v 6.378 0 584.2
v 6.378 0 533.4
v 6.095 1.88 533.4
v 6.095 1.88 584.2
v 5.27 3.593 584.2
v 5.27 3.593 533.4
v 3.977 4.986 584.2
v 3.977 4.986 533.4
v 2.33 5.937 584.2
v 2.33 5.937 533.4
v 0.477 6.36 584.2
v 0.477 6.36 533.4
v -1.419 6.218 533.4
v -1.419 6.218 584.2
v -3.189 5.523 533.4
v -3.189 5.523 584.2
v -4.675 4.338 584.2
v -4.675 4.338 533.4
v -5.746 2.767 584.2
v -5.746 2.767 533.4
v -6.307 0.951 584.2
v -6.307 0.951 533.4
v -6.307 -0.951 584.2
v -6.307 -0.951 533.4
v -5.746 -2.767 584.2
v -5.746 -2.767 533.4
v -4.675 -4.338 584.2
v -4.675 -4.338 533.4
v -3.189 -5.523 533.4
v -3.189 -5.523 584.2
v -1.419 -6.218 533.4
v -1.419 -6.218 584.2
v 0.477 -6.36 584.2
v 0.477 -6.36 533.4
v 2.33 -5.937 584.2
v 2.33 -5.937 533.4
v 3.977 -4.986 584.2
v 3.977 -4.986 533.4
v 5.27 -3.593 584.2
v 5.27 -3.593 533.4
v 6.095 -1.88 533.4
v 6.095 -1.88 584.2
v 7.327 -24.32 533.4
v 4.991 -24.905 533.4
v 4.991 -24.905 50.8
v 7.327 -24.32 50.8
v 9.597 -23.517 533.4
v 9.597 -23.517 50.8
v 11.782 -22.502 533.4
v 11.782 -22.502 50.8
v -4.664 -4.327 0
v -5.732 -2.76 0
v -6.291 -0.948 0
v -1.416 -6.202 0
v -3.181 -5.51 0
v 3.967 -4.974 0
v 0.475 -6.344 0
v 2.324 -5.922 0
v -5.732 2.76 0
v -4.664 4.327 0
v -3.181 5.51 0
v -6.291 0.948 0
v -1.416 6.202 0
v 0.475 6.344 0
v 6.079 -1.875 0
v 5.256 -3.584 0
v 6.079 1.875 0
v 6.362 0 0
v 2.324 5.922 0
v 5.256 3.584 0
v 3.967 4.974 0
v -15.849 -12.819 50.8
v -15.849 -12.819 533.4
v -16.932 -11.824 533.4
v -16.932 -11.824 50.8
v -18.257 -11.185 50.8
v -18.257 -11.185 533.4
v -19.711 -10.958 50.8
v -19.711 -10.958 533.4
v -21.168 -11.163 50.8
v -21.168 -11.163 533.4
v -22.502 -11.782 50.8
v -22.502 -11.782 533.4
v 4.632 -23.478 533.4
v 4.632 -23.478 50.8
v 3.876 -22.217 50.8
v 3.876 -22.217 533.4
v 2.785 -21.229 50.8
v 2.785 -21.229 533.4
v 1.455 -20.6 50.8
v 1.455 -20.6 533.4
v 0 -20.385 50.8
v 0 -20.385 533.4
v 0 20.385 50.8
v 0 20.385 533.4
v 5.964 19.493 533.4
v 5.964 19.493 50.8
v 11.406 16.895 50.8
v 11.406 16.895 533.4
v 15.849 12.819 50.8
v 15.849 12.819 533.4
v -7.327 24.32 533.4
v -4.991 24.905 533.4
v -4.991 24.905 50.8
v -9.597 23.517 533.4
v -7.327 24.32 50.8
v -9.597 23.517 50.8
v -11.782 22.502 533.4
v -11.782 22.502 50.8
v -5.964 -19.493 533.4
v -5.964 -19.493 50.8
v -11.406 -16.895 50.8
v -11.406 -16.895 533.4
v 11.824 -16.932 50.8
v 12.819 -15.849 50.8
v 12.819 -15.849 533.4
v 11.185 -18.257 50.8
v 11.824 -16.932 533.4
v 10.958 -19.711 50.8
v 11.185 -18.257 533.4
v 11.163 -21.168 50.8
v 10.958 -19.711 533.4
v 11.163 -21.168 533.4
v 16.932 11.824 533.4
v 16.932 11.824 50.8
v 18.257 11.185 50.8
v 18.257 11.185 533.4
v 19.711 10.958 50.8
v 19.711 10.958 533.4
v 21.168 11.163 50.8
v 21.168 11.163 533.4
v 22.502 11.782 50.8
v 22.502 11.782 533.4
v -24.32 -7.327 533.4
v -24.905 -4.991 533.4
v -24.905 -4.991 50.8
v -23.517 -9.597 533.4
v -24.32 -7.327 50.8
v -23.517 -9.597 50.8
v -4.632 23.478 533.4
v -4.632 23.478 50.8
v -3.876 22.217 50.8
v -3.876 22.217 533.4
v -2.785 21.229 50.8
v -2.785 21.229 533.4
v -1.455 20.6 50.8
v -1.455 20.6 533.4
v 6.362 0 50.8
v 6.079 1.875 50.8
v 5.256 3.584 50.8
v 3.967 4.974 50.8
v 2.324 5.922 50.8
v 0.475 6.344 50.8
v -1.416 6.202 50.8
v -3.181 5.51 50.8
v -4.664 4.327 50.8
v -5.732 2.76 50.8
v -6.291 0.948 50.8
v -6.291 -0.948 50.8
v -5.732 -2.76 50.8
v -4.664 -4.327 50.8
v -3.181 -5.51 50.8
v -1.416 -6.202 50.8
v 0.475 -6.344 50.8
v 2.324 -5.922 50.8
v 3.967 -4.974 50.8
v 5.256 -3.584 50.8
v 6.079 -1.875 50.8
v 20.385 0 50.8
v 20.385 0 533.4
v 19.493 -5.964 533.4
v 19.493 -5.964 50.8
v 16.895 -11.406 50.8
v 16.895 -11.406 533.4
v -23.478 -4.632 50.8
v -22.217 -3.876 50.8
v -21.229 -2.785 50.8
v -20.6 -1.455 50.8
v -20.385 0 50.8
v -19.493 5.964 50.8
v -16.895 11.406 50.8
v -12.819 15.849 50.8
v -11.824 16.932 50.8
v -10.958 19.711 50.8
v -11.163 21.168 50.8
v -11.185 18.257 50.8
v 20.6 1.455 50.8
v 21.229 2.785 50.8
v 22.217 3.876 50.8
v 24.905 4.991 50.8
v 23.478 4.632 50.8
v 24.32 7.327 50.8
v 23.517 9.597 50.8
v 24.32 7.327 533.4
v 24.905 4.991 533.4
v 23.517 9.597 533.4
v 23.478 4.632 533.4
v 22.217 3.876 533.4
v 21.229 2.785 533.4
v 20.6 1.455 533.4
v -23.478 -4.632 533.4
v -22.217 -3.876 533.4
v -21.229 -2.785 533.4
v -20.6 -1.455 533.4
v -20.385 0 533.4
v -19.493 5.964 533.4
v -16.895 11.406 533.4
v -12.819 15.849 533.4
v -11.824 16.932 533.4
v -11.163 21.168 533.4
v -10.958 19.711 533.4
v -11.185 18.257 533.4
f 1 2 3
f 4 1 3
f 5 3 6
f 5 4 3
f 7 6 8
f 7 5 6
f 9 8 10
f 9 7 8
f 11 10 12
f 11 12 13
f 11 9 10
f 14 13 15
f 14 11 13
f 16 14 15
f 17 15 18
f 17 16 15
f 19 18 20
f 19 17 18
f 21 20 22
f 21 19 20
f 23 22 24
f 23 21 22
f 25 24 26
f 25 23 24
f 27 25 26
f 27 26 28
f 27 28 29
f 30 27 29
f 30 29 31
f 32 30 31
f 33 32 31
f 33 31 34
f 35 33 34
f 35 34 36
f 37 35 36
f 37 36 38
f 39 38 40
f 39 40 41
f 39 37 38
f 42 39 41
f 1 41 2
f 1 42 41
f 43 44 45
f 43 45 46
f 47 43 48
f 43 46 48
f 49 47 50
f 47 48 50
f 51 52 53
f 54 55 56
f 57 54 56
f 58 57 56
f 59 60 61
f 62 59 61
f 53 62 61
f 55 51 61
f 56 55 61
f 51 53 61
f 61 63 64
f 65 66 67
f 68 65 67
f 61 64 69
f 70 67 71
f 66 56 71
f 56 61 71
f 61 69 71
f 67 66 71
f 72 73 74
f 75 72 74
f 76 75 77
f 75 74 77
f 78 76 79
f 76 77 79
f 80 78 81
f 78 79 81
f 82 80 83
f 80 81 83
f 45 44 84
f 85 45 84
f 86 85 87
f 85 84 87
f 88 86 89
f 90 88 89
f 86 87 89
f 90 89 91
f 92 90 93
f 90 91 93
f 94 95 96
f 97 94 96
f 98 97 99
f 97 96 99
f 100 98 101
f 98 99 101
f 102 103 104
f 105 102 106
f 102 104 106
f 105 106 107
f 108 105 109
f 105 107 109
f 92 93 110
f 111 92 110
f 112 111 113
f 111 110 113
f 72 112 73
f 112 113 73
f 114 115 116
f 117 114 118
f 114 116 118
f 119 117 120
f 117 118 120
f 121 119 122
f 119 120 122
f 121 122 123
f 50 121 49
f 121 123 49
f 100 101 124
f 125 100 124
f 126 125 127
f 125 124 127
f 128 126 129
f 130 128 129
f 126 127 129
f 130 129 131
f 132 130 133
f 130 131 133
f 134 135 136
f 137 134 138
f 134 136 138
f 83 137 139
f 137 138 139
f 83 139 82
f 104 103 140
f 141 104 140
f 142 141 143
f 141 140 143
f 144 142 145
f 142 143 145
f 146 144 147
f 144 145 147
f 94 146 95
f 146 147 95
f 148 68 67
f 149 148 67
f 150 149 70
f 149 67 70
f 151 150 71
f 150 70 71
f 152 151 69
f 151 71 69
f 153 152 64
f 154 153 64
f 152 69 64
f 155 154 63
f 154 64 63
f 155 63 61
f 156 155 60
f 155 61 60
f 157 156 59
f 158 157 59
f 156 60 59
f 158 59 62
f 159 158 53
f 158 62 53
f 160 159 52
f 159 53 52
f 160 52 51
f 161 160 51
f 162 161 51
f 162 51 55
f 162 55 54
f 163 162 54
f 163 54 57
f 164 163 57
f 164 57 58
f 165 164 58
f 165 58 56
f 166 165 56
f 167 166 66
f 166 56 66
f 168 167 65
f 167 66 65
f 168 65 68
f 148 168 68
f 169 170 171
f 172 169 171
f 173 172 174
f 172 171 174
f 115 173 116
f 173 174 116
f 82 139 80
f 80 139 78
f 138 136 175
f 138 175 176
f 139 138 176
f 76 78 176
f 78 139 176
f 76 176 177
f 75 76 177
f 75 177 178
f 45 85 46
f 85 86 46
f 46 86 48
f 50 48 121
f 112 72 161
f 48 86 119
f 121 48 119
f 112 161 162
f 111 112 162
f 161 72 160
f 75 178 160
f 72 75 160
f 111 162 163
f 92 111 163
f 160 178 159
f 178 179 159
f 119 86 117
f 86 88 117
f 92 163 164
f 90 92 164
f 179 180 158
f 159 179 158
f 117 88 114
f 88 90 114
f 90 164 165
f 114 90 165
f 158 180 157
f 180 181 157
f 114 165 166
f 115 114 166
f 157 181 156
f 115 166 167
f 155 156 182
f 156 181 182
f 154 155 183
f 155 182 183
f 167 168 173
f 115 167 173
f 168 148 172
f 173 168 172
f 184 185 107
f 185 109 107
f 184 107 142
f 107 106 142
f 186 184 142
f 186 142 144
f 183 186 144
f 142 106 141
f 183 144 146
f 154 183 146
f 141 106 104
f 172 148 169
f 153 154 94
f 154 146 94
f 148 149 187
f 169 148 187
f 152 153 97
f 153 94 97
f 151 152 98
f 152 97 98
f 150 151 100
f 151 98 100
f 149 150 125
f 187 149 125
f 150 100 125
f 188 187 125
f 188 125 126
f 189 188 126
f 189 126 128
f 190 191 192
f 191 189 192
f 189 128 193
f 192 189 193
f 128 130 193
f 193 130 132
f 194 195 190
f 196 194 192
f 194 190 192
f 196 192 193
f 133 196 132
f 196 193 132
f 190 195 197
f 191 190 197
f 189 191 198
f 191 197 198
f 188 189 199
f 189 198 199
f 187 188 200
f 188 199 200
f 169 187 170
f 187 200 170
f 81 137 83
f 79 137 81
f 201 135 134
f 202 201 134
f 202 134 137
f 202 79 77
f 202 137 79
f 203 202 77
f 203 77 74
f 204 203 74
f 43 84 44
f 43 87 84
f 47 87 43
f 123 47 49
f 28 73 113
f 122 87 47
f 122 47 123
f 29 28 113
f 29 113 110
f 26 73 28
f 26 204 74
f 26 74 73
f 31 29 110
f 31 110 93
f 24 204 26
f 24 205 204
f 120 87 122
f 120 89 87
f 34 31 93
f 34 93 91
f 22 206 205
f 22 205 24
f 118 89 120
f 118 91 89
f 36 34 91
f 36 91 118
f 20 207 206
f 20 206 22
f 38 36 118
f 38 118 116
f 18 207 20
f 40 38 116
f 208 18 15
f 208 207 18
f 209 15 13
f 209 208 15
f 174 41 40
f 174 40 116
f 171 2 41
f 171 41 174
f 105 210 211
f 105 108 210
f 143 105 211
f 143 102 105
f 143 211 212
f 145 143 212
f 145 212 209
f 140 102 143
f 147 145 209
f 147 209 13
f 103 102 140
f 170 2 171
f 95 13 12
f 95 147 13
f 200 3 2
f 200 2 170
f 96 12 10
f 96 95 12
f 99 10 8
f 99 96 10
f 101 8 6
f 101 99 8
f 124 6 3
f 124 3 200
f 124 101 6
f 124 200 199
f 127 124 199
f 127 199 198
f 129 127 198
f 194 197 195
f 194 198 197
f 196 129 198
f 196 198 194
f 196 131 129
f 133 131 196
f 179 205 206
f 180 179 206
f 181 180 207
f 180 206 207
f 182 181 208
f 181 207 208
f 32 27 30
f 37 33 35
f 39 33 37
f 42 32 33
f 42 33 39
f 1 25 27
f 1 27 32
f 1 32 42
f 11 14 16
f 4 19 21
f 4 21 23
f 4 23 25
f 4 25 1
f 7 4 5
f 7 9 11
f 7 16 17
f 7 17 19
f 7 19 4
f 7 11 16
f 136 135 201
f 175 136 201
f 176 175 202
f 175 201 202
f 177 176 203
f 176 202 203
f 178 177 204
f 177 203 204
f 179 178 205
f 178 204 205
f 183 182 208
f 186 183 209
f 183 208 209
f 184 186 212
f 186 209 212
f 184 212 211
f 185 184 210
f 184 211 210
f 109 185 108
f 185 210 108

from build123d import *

# Parameters (mm, degrees)
SKETCH1_R           = 25.4
BOSS_EXTRUDE1_DEPTH = 584.2
SKETCH2_OUTSIDE_W   = 170.52
SKETCH2_OUTSIDE_H   = 170.52
SKETCH2_OUTSIDE_R   = 6.361935525
CUT_EXTRUDE1_DEPTH  = 50.8
SKETCH5_OUTSIDE_W   = 170.52
SKETCH5_OUTSIDE_H   = 170.52
SKETCH5_OUTSIDE_R   = 6.377907631
CUT_EXTRUDE4_DEPTH  = 50.8
CUT_EXTRUDE5_DEPTH  = 535.94
CIRPATTERN1_COUNT   = 4


with BuildPart() as part:
    # Sketch1 → Boss-Extrude1 (new body)
    with BuildSketch(Plane.XY):
        Circle(SKETCH1_R)
    extrude(amount=BOSS_EXTRUDE1_DEPTH)

    # Sketch2 outside → Cut-Extrude1 (cut)
    with BuildSketch(Plane.XY):
        Rectangle(SKETCH2_OUTSIDE_W, SKETCH2_OUTSIDE_H)
        Circle(SKETCH2_OUTSIDE_R, mode=Mode.SUBTRACT)
    extrude(amount=CUT_EXTRUDE1_DEPTH, mode=Mode.SUBTRACT)

    # Sketch5 outside → Cut-Extrude4 (cut)
    with BuildSketch(Plane.XY.offset(584.2)):
        Rectangle(SKETCH5_OUTSIDE_W, SKETCH5_OUTSIDE_H)
        Circle(SKETCH5_OUTSIDE_R, mode=Mode.SUBTRACT)
    extrude(amount=-CUT_EXTRUDE4_DEPTH, mode=Mode.SUBTRACT)

    # Sketch13 → Cut-Extrude5 (cut)
    with BuildSketch(Plane.XY.offset(584.2)):
        with BuildLine():
            ThreePointArc((23.648188812, 19.127264814), (13.102061479, 27.448589733), (0, 30.415277302))
            ThreePointArc((0, 30.415277302), (-5.015277302, 25.4), (0, 20.384722698))
            ThreePointArc((0, 20.384722698), (8.781175571, 18.396409298), (15.84933014, 12.819346848))
            ThreePointArc((15.84933014, 12.819346848), (22.902718459, 12.073876495), (23.648188812, 19.127264814))
        make_face()
    cut_extrude5 = extrude(amount=-CUT_EXTRUDE5_DEPTH, mode=Mode.SUBTRACT)

    # CirPattern1: Cut-Extrude5 ×4 about axis
    cirpattern1_axis = Axis((0, 0, 533.4), (0, 0, -1))
    for i in range(1, CIRPATTERN1_COUNT):
        add(cut_extrude5.rotate(cirpattern1_axis, i * 360 / CIRPATTERN1_COUNT), mode=Mode.SUBTRACT)


solid = part.part
